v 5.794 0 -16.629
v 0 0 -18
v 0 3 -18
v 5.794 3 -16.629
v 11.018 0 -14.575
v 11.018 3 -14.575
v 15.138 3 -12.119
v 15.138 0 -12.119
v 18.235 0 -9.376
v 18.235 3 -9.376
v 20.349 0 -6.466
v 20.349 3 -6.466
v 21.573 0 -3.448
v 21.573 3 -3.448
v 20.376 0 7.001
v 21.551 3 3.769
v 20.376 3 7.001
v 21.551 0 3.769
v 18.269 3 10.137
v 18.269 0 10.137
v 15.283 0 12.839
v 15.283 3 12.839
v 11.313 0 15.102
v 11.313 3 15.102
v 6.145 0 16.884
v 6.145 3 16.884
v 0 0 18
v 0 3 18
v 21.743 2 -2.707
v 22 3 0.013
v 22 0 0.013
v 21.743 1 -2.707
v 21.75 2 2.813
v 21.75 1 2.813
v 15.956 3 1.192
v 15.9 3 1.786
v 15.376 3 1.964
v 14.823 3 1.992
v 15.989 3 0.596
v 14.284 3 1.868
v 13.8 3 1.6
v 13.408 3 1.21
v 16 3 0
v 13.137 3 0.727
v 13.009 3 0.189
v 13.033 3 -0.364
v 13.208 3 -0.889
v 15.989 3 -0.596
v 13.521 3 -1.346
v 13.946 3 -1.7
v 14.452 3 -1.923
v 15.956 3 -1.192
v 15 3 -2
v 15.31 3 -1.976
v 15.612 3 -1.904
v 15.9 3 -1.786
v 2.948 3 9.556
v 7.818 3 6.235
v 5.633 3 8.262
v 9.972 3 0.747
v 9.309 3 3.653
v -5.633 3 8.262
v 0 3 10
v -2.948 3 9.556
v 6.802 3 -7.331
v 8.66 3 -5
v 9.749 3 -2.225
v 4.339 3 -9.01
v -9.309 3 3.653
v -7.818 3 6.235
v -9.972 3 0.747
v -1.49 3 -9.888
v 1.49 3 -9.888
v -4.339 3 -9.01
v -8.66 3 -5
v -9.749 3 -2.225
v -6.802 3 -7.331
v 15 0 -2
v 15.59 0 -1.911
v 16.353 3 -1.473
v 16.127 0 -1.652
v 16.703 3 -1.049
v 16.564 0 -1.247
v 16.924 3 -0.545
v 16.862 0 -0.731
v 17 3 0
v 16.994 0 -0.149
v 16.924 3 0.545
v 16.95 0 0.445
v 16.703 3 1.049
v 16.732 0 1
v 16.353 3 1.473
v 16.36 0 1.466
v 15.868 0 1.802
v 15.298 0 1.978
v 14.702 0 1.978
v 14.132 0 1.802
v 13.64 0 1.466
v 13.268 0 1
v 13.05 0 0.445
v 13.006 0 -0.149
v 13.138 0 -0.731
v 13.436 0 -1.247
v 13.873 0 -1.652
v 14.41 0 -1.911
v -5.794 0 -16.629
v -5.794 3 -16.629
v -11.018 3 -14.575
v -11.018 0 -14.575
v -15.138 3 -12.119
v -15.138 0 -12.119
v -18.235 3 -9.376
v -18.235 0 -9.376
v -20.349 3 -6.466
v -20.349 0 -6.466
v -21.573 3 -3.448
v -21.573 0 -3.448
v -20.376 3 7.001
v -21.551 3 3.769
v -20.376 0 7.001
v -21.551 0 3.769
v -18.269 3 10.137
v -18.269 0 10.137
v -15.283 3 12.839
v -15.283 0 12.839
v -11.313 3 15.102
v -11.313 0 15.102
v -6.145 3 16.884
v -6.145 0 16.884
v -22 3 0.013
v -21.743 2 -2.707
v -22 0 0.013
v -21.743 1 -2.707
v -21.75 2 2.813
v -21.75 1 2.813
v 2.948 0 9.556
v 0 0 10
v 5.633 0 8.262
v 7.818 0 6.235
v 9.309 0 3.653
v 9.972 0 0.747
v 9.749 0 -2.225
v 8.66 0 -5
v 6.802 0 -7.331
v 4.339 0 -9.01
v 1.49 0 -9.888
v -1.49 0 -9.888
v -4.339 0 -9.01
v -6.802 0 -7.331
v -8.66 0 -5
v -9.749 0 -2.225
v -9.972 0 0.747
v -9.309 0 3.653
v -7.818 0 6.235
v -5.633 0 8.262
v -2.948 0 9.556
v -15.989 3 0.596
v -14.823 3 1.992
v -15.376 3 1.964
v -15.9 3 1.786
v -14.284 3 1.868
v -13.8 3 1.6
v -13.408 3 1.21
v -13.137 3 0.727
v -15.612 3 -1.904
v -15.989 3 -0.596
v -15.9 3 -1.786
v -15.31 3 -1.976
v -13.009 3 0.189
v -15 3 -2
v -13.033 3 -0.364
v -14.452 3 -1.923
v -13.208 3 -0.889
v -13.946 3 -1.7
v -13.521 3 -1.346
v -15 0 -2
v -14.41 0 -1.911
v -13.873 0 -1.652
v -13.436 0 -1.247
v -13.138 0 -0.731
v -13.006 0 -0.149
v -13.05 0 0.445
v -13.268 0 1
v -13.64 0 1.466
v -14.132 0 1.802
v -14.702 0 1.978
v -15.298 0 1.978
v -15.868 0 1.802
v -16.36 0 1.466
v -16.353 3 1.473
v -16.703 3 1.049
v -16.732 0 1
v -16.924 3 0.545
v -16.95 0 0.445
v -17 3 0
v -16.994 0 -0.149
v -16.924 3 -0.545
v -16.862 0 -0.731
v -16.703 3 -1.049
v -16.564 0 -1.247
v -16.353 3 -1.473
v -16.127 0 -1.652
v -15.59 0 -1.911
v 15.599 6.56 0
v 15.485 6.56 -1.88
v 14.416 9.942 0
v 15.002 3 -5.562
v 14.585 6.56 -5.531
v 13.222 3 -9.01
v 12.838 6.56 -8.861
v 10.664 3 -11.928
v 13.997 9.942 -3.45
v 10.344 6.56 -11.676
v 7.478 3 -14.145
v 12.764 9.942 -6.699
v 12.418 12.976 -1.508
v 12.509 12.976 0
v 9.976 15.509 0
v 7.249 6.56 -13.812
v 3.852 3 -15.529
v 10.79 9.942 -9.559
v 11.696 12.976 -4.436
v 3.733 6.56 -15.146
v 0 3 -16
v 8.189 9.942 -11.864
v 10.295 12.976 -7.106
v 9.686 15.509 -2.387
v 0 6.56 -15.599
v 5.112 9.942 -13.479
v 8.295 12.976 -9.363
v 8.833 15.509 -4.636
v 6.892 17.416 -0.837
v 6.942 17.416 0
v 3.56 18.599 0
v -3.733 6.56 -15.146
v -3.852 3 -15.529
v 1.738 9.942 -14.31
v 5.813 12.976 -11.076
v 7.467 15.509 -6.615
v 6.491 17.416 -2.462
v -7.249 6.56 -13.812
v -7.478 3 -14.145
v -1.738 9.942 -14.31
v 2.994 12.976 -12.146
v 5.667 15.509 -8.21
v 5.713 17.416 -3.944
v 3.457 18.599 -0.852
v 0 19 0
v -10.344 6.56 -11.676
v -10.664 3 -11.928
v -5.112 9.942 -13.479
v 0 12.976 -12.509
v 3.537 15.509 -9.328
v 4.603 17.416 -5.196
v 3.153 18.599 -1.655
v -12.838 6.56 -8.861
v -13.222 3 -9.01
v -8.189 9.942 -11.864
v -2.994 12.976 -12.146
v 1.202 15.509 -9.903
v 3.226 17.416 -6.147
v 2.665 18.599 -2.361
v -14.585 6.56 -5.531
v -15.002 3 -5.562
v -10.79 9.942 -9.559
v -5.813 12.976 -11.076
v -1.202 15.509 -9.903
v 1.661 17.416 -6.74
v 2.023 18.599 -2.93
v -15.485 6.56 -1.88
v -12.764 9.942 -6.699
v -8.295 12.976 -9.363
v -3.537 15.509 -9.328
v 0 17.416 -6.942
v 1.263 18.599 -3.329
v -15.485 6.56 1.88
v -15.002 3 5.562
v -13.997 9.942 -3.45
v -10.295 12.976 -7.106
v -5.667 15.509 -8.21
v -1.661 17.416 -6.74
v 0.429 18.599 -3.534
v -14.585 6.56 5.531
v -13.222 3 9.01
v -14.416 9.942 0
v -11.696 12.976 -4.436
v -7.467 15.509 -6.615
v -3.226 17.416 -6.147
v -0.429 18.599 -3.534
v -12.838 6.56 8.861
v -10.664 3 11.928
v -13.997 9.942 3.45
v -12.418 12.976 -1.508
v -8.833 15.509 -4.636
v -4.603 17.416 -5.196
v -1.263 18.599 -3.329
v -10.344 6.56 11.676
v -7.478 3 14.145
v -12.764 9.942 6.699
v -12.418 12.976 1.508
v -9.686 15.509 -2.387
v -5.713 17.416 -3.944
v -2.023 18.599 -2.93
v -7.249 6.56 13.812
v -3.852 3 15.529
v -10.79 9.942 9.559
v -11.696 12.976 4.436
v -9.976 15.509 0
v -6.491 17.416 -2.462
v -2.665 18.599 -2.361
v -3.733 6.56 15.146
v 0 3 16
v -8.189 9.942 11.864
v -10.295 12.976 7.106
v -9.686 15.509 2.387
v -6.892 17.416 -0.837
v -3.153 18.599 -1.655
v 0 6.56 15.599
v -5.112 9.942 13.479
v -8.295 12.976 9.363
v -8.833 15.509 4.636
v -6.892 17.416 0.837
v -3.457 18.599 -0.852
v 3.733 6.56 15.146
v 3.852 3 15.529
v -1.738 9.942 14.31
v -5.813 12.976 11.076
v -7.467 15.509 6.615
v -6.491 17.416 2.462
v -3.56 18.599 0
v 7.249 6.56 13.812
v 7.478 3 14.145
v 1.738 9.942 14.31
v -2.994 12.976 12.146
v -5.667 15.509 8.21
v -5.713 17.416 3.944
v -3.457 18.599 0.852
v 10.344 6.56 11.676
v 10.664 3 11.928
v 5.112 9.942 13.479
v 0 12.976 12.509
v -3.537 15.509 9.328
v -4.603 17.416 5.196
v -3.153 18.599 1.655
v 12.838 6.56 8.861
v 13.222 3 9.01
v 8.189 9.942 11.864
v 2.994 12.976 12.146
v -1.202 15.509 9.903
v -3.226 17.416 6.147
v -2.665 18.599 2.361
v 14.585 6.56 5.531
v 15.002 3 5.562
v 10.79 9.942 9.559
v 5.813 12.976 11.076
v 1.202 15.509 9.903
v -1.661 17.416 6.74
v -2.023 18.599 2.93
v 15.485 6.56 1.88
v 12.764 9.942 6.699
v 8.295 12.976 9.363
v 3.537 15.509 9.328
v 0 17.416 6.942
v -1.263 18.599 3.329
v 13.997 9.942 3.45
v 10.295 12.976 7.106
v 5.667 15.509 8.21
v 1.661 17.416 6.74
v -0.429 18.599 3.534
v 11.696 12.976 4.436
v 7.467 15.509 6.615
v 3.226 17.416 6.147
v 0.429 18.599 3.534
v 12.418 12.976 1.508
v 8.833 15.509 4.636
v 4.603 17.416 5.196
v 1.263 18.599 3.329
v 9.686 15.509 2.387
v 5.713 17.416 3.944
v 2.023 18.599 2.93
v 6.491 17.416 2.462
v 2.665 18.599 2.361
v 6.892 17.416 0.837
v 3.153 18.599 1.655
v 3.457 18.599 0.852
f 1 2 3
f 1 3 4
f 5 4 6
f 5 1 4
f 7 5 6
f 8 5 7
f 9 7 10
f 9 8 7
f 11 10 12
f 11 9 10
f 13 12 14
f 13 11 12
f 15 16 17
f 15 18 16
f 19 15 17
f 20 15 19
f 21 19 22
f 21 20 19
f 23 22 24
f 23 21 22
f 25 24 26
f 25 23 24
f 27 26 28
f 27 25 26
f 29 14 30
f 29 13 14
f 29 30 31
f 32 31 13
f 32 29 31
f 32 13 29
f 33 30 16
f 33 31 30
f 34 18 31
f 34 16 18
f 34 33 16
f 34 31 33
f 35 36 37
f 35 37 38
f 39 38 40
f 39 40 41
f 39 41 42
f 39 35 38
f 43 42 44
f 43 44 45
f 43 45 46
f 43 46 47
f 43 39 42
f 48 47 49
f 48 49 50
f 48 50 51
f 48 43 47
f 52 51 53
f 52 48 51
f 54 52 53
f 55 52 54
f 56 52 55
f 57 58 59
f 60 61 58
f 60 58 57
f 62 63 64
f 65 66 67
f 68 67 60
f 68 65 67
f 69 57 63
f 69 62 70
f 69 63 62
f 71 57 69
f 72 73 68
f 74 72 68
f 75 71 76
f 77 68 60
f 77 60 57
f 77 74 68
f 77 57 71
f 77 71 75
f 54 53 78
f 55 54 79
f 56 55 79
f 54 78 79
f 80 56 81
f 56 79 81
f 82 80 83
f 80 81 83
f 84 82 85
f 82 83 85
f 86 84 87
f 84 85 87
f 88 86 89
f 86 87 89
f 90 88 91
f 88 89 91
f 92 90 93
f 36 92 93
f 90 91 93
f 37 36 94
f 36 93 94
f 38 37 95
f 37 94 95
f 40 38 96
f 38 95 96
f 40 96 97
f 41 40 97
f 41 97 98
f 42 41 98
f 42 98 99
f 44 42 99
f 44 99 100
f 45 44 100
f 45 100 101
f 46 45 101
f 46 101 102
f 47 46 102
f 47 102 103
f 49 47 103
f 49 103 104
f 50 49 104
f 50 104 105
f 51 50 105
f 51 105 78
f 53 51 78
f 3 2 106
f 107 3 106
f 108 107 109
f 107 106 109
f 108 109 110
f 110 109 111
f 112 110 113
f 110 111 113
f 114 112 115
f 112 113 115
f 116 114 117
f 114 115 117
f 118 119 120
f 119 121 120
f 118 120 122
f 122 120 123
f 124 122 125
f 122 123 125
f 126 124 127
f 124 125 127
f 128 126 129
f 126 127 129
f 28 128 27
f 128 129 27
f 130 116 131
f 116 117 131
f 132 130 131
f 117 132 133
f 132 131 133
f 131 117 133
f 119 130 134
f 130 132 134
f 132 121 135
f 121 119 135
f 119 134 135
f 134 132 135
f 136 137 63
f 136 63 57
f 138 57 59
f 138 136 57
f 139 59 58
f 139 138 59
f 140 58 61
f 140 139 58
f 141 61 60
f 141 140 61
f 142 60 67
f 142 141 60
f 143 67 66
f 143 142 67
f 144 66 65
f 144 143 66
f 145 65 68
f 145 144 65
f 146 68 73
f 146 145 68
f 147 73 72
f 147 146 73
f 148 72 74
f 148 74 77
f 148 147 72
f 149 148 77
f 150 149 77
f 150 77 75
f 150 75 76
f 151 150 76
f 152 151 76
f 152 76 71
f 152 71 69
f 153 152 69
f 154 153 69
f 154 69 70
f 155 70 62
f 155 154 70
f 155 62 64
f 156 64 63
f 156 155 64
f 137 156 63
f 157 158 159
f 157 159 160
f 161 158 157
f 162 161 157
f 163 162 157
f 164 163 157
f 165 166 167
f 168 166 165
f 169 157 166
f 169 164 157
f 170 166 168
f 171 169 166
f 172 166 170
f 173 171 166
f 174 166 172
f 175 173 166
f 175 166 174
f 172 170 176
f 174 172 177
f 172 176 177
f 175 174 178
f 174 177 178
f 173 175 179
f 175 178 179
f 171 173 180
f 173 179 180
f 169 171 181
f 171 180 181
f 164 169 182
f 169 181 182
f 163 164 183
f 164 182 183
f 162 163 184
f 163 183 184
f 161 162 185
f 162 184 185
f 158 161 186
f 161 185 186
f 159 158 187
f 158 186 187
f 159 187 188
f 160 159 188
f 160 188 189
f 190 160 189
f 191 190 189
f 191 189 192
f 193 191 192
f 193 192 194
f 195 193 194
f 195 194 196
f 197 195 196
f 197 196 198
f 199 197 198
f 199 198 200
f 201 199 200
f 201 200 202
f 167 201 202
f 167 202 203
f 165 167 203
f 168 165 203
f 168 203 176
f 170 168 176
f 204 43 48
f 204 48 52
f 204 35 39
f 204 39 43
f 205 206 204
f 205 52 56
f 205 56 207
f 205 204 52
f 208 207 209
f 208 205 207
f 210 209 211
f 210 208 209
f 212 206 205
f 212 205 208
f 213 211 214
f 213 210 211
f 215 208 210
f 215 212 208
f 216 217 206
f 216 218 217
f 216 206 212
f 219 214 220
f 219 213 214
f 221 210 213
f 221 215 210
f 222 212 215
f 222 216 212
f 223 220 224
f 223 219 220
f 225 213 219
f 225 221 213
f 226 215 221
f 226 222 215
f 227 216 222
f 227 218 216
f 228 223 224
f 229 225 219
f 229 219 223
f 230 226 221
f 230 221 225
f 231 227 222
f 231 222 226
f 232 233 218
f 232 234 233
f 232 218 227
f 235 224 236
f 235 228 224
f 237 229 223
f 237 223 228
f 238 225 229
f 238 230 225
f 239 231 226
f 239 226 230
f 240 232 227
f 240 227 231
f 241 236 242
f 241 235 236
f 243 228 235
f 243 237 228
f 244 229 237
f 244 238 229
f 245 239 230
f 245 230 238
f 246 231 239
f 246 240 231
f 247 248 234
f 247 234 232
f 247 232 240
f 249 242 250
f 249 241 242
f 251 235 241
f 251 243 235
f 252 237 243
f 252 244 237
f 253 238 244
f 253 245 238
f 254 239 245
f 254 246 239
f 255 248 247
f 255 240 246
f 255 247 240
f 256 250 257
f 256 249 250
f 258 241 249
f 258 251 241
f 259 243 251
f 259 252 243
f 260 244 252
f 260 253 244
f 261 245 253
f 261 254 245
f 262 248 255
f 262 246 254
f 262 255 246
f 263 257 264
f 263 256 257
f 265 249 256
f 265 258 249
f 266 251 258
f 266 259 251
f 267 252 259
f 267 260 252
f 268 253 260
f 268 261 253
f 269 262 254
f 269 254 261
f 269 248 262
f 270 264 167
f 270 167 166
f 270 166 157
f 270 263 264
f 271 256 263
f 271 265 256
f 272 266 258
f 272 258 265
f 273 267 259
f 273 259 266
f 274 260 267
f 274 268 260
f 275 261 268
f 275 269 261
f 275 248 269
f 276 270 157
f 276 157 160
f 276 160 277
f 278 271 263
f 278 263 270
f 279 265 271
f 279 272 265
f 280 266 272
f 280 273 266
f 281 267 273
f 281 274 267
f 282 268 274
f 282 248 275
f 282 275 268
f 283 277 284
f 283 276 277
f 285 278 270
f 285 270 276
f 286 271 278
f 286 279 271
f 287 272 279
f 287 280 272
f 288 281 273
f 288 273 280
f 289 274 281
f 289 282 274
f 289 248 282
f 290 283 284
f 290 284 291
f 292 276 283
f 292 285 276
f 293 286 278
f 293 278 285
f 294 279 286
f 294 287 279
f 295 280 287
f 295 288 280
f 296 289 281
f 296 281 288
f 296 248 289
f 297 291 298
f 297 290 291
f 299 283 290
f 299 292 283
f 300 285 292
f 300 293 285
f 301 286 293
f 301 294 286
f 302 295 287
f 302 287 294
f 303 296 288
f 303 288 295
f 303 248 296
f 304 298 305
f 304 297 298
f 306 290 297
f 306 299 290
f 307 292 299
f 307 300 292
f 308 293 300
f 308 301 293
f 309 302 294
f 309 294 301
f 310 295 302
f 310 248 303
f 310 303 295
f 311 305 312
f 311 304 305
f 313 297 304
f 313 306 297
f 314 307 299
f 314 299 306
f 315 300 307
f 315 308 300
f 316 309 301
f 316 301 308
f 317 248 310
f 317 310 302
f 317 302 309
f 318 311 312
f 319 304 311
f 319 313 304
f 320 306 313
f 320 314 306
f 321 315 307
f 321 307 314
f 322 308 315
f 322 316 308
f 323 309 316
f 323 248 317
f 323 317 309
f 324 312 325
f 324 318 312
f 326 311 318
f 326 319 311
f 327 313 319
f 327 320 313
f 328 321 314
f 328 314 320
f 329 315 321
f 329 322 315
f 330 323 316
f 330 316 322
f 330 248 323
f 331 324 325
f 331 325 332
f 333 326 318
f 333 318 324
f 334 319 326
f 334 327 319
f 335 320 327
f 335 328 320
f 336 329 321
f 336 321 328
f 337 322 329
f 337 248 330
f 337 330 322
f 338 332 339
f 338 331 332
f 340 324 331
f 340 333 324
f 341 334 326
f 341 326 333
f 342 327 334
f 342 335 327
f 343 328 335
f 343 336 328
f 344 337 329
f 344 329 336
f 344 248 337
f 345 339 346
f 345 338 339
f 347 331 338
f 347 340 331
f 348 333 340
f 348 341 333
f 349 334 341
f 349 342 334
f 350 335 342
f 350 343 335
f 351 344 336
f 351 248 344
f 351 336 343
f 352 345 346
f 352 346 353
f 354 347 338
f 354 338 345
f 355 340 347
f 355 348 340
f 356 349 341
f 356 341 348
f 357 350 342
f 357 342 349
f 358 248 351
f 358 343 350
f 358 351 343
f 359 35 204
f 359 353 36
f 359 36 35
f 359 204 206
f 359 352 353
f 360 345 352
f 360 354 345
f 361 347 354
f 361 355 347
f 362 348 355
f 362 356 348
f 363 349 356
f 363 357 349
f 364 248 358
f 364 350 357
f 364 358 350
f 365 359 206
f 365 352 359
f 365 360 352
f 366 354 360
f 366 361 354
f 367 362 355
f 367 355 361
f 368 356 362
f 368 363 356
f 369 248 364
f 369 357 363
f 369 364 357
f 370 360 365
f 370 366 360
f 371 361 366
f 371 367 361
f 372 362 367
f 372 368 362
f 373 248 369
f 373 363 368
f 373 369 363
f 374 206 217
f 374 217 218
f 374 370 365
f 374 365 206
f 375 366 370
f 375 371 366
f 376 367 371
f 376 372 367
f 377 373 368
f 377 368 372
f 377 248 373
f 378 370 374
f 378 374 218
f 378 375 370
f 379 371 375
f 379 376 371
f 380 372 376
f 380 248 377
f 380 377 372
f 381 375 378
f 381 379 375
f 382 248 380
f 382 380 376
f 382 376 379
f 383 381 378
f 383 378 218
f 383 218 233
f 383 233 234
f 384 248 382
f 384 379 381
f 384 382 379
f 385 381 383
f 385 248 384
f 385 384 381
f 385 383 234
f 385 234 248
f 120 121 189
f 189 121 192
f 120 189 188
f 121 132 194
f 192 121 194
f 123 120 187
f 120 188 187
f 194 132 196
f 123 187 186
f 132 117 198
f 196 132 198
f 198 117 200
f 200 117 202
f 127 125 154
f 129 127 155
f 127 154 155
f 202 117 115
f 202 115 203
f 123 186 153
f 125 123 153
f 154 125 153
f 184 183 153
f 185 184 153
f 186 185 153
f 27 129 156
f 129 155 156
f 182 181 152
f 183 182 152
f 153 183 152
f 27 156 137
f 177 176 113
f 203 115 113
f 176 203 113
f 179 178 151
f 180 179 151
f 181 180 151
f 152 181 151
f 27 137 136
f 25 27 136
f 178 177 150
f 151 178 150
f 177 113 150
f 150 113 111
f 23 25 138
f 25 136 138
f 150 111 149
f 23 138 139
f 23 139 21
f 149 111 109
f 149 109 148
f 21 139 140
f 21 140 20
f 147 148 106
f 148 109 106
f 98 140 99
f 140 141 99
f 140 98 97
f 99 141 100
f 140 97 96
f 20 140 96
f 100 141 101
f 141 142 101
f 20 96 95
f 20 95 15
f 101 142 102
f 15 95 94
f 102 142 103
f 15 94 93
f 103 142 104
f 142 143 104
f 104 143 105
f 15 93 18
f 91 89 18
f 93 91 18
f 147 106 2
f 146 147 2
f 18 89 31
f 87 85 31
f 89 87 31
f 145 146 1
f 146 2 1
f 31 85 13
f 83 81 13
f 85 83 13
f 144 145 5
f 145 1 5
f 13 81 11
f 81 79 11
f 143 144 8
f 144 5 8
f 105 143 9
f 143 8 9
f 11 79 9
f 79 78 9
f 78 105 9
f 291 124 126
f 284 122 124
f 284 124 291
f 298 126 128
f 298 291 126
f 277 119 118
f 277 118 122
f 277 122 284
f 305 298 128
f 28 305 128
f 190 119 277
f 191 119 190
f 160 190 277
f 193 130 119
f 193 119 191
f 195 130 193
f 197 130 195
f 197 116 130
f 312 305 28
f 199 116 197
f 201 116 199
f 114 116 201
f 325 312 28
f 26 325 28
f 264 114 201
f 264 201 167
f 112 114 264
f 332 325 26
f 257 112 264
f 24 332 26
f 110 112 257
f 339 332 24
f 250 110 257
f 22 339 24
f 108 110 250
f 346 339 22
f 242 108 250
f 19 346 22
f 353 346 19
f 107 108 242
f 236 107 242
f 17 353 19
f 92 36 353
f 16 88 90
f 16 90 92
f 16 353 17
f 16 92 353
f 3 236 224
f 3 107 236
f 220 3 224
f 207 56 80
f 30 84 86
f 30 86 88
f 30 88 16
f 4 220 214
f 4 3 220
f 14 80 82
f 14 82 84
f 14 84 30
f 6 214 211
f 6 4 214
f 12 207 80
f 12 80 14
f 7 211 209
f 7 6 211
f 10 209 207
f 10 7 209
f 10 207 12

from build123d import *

# Parameters (mm, degrees)
SKETCH_3_R          = 10
EXTRUDE_1_DEPTH     = 3
SKETCH_5_R          = 2
CUT_EXTRUDE_1_DEPTH = 3


with BuildPart() as part:
    # 草圖3 → 填料-伸長1 (new body)
    with BuildSketch(Plane(origin=(0, 0, 0), x_dir=(1, 0, 0), z_dir=(0, 1, 0))):
        with BuildLine():
            add(Edge.make_bspline(
                [(0, 18), (-10.982009899, 16.1458907), (-22.248773715, 9.401529612), (-21.913780718, -9.858427216), (-12.856442382, -16.504271701), (0, -18)],
                knots=[0, 0, 0, 0, 0.441059859, 0.541059859, 1, 1, 1, 1], degree=3))
            add(Edge.make_bspline(
                [(0, 18), (10.982009899, 16.1458907), (22.248773715, 9.401529612), (21.913780718, -9.858427216), (12.856442382, -16.504271701), (0, -18)],
                knots=[0, 0, 0, 0, 0.441059859, 0.541059859, 1, 1, 1, 1], degree=3))
        make_face()
        with Locations(Location((0, 0, 0), (0, 0, 270))):
            Circle(SKETCH_3_R, mode=Mode.SUBTRACT)
    extrude(amount=EXTRUDE_1_DEPTH)

    # 草圖4 → 旋轉1 (revolve)
    with BuildSketch(Plane.XY):
        with BuildLine():
            Line((0, 3), (16, 3))
            ThreePointArc((16, 3), (11.313708499, 14.313708499), (0, 19))
            Line((0, 19), (0, 3))
        make_face()
    revolve(axis=Axis((0, 3, 0), (0, 1, 0)))

    # 草圖5 → 除料-伸長1 (cut)
    with BuildSketch(Plane.XZ):
        with Locations(Location((-15, 0, 0), (0, 0, 270))):
            Circle(SKETCH_5_R)
        with Locations(Location((15, 0, 0), (0, 0, 270))):
            Circle(SKETCH_5_R)
    extrude(amount=-CUT_EXTRUDE_1_DEPTH, mode=Mode.SUBTRACT)


solid = part.part
